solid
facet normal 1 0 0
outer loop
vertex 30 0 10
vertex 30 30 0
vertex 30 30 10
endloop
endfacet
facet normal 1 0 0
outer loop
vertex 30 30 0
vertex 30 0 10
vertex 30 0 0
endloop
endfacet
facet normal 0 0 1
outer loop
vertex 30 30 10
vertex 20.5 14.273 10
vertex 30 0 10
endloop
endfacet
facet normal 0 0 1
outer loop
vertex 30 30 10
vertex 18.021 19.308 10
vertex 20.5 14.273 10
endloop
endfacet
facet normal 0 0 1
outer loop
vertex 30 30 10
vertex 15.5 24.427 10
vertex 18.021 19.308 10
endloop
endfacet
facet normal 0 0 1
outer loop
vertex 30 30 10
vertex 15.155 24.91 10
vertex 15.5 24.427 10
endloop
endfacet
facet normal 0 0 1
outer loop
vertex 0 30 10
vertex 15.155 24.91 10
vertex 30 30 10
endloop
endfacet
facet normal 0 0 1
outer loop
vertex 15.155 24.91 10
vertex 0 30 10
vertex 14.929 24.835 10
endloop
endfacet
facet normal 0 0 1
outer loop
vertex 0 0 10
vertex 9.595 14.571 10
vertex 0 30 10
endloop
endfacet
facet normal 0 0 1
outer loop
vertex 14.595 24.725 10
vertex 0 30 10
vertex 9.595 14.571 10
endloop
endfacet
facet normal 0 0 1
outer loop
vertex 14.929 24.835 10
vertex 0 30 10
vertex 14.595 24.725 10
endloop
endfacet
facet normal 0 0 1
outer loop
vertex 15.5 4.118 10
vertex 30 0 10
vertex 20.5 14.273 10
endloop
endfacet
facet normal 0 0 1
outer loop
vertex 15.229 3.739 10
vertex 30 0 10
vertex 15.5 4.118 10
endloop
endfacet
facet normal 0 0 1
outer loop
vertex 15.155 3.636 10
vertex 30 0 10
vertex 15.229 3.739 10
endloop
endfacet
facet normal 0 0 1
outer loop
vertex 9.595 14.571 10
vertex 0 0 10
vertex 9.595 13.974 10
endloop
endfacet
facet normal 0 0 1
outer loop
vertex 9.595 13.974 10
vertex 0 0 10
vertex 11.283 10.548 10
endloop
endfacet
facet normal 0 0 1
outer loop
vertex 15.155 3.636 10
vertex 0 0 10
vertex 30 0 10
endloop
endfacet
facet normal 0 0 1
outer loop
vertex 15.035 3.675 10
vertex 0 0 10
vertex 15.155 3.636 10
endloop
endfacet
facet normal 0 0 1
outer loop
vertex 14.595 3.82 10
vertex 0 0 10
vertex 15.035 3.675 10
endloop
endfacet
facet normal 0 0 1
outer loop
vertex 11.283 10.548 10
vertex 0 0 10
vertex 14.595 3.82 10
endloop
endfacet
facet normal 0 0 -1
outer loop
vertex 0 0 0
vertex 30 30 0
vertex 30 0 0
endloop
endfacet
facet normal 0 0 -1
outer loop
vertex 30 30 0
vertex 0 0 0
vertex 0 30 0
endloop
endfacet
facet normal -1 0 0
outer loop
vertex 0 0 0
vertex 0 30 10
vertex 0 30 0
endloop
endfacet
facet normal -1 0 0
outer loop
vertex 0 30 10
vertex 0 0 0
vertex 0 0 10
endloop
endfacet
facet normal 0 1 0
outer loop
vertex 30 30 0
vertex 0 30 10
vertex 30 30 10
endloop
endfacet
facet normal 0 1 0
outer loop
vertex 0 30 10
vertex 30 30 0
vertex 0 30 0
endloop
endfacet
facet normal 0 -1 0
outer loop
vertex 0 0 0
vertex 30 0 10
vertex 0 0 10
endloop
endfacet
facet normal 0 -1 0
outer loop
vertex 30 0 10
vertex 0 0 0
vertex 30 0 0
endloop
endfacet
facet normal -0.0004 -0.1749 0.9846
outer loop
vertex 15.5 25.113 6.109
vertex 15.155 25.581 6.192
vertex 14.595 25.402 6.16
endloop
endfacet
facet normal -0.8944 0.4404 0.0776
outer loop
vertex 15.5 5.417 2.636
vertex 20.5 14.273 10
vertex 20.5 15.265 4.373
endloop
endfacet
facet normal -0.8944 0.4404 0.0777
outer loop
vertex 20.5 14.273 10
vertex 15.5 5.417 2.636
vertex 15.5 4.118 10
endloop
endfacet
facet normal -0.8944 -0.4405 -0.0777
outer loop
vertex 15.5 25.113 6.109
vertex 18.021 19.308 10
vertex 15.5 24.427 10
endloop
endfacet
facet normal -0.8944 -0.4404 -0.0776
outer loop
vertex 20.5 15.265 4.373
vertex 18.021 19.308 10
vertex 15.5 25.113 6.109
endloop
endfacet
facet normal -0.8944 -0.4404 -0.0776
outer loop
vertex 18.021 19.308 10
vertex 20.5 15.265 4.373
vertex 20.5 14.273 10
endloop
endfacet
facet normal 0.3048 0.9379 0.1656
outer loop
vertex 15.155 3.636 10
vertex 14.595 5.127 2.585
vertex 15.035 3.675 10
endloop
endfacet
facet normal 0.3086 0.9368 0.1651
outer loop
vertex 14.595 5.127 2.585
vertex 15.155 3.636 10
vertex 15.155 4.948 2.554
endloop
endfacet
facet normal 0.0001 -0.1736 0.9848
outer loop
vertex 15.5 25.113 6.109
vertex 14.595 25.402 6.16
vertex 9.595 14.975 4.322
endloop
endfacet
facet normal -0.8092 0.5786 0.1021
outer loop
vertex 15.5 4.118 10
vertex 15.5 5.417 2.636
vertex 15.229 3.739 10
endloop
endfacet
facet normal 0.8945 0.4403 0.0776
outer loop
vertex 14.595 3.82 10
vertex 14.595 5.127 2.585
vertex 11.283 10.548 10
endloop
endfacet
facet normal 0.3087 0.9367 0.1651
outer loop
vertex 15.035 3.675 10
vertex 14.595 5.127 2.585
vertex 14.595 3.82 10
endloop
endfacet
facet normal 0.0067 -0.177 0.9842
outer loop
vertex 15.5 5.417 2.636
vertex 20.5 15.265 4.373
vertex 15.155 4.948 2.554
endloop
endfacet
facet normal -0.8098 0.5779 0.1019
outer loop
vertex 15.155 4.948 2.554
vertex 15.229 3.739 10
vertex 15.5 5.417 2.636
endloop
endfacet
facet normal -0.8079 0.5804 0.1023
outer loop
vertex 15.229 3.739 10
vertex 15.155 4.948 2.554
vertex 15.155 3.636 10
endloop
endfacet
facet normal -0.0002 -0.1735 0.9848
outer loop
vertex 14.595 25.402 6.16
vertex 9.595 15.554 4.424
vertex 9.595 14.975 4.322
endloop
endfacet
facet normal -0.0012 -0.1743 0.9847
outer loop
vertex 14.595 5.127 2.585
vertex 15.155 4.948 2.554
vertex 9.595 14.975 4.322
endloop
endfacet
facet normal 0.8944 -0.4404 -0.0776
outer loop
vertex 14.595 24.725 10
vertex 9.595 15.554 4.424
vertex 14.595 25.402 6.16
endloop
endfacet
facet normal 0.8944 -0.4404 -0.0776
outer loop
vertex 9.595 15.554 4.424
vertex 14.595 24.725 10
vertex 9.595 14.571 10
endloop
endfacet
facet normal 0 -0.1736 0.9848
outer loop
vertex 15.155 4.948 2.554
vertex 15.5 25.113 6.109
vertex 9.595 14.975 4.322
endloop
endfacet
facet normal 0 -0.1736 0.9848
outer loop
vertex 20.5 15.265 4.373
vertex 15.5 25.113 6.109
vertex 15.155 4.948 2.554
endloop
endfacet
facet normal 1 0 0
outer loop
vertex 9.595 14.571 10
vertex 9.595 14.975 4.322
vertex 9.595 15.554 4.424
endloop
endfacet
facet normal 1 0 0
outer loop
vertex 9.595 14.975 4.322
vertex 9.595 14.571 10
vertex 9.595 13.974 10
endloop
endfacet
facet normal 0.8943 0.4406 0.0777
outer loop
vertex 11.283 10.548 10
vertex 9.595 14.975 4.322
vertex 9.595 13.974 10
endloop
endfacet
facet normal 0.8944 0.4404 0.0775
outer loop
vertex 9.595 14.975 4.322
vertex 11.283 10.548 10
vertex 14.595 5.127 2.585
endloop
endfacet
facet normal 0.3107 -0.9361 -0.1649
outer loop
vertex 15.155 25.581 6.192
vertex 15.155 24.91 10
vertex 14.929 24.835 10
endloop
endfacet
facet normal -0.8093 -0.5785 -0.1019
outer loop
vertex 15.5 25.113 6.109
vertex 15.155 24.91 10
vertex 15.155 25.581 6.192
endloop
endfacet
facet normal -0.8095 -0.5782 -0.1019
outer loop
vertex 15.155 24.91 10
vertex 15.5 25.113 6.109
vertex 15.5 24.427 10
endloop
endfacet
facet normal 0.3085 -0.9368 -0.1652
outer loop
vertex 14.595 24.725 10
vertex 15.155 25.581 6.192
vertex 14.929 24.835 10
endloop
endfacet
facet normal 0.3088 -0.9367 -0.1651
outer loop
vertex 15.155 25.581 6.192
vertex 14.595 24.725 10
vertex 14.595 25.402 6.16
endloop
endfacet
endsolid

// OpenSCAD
// corpus 3031235 (a nut's string slots): a resize()d square ⊕ a cylinder, tipped and cut from a block.
// Its sides are straight B-splines; extruded as they came, the slot cut nothing from the block.
difference() {
  cube([30, 30, 10]);
  translate([15, 5, 5]) rotate([10, 0, 0]) minkowski() {
    cylinder(d = 1, h = 4.8, center = true);
    resize([10, 20]) rotate([0, 0, 45]) cube([10, 10, 4.8]);
  }
}
